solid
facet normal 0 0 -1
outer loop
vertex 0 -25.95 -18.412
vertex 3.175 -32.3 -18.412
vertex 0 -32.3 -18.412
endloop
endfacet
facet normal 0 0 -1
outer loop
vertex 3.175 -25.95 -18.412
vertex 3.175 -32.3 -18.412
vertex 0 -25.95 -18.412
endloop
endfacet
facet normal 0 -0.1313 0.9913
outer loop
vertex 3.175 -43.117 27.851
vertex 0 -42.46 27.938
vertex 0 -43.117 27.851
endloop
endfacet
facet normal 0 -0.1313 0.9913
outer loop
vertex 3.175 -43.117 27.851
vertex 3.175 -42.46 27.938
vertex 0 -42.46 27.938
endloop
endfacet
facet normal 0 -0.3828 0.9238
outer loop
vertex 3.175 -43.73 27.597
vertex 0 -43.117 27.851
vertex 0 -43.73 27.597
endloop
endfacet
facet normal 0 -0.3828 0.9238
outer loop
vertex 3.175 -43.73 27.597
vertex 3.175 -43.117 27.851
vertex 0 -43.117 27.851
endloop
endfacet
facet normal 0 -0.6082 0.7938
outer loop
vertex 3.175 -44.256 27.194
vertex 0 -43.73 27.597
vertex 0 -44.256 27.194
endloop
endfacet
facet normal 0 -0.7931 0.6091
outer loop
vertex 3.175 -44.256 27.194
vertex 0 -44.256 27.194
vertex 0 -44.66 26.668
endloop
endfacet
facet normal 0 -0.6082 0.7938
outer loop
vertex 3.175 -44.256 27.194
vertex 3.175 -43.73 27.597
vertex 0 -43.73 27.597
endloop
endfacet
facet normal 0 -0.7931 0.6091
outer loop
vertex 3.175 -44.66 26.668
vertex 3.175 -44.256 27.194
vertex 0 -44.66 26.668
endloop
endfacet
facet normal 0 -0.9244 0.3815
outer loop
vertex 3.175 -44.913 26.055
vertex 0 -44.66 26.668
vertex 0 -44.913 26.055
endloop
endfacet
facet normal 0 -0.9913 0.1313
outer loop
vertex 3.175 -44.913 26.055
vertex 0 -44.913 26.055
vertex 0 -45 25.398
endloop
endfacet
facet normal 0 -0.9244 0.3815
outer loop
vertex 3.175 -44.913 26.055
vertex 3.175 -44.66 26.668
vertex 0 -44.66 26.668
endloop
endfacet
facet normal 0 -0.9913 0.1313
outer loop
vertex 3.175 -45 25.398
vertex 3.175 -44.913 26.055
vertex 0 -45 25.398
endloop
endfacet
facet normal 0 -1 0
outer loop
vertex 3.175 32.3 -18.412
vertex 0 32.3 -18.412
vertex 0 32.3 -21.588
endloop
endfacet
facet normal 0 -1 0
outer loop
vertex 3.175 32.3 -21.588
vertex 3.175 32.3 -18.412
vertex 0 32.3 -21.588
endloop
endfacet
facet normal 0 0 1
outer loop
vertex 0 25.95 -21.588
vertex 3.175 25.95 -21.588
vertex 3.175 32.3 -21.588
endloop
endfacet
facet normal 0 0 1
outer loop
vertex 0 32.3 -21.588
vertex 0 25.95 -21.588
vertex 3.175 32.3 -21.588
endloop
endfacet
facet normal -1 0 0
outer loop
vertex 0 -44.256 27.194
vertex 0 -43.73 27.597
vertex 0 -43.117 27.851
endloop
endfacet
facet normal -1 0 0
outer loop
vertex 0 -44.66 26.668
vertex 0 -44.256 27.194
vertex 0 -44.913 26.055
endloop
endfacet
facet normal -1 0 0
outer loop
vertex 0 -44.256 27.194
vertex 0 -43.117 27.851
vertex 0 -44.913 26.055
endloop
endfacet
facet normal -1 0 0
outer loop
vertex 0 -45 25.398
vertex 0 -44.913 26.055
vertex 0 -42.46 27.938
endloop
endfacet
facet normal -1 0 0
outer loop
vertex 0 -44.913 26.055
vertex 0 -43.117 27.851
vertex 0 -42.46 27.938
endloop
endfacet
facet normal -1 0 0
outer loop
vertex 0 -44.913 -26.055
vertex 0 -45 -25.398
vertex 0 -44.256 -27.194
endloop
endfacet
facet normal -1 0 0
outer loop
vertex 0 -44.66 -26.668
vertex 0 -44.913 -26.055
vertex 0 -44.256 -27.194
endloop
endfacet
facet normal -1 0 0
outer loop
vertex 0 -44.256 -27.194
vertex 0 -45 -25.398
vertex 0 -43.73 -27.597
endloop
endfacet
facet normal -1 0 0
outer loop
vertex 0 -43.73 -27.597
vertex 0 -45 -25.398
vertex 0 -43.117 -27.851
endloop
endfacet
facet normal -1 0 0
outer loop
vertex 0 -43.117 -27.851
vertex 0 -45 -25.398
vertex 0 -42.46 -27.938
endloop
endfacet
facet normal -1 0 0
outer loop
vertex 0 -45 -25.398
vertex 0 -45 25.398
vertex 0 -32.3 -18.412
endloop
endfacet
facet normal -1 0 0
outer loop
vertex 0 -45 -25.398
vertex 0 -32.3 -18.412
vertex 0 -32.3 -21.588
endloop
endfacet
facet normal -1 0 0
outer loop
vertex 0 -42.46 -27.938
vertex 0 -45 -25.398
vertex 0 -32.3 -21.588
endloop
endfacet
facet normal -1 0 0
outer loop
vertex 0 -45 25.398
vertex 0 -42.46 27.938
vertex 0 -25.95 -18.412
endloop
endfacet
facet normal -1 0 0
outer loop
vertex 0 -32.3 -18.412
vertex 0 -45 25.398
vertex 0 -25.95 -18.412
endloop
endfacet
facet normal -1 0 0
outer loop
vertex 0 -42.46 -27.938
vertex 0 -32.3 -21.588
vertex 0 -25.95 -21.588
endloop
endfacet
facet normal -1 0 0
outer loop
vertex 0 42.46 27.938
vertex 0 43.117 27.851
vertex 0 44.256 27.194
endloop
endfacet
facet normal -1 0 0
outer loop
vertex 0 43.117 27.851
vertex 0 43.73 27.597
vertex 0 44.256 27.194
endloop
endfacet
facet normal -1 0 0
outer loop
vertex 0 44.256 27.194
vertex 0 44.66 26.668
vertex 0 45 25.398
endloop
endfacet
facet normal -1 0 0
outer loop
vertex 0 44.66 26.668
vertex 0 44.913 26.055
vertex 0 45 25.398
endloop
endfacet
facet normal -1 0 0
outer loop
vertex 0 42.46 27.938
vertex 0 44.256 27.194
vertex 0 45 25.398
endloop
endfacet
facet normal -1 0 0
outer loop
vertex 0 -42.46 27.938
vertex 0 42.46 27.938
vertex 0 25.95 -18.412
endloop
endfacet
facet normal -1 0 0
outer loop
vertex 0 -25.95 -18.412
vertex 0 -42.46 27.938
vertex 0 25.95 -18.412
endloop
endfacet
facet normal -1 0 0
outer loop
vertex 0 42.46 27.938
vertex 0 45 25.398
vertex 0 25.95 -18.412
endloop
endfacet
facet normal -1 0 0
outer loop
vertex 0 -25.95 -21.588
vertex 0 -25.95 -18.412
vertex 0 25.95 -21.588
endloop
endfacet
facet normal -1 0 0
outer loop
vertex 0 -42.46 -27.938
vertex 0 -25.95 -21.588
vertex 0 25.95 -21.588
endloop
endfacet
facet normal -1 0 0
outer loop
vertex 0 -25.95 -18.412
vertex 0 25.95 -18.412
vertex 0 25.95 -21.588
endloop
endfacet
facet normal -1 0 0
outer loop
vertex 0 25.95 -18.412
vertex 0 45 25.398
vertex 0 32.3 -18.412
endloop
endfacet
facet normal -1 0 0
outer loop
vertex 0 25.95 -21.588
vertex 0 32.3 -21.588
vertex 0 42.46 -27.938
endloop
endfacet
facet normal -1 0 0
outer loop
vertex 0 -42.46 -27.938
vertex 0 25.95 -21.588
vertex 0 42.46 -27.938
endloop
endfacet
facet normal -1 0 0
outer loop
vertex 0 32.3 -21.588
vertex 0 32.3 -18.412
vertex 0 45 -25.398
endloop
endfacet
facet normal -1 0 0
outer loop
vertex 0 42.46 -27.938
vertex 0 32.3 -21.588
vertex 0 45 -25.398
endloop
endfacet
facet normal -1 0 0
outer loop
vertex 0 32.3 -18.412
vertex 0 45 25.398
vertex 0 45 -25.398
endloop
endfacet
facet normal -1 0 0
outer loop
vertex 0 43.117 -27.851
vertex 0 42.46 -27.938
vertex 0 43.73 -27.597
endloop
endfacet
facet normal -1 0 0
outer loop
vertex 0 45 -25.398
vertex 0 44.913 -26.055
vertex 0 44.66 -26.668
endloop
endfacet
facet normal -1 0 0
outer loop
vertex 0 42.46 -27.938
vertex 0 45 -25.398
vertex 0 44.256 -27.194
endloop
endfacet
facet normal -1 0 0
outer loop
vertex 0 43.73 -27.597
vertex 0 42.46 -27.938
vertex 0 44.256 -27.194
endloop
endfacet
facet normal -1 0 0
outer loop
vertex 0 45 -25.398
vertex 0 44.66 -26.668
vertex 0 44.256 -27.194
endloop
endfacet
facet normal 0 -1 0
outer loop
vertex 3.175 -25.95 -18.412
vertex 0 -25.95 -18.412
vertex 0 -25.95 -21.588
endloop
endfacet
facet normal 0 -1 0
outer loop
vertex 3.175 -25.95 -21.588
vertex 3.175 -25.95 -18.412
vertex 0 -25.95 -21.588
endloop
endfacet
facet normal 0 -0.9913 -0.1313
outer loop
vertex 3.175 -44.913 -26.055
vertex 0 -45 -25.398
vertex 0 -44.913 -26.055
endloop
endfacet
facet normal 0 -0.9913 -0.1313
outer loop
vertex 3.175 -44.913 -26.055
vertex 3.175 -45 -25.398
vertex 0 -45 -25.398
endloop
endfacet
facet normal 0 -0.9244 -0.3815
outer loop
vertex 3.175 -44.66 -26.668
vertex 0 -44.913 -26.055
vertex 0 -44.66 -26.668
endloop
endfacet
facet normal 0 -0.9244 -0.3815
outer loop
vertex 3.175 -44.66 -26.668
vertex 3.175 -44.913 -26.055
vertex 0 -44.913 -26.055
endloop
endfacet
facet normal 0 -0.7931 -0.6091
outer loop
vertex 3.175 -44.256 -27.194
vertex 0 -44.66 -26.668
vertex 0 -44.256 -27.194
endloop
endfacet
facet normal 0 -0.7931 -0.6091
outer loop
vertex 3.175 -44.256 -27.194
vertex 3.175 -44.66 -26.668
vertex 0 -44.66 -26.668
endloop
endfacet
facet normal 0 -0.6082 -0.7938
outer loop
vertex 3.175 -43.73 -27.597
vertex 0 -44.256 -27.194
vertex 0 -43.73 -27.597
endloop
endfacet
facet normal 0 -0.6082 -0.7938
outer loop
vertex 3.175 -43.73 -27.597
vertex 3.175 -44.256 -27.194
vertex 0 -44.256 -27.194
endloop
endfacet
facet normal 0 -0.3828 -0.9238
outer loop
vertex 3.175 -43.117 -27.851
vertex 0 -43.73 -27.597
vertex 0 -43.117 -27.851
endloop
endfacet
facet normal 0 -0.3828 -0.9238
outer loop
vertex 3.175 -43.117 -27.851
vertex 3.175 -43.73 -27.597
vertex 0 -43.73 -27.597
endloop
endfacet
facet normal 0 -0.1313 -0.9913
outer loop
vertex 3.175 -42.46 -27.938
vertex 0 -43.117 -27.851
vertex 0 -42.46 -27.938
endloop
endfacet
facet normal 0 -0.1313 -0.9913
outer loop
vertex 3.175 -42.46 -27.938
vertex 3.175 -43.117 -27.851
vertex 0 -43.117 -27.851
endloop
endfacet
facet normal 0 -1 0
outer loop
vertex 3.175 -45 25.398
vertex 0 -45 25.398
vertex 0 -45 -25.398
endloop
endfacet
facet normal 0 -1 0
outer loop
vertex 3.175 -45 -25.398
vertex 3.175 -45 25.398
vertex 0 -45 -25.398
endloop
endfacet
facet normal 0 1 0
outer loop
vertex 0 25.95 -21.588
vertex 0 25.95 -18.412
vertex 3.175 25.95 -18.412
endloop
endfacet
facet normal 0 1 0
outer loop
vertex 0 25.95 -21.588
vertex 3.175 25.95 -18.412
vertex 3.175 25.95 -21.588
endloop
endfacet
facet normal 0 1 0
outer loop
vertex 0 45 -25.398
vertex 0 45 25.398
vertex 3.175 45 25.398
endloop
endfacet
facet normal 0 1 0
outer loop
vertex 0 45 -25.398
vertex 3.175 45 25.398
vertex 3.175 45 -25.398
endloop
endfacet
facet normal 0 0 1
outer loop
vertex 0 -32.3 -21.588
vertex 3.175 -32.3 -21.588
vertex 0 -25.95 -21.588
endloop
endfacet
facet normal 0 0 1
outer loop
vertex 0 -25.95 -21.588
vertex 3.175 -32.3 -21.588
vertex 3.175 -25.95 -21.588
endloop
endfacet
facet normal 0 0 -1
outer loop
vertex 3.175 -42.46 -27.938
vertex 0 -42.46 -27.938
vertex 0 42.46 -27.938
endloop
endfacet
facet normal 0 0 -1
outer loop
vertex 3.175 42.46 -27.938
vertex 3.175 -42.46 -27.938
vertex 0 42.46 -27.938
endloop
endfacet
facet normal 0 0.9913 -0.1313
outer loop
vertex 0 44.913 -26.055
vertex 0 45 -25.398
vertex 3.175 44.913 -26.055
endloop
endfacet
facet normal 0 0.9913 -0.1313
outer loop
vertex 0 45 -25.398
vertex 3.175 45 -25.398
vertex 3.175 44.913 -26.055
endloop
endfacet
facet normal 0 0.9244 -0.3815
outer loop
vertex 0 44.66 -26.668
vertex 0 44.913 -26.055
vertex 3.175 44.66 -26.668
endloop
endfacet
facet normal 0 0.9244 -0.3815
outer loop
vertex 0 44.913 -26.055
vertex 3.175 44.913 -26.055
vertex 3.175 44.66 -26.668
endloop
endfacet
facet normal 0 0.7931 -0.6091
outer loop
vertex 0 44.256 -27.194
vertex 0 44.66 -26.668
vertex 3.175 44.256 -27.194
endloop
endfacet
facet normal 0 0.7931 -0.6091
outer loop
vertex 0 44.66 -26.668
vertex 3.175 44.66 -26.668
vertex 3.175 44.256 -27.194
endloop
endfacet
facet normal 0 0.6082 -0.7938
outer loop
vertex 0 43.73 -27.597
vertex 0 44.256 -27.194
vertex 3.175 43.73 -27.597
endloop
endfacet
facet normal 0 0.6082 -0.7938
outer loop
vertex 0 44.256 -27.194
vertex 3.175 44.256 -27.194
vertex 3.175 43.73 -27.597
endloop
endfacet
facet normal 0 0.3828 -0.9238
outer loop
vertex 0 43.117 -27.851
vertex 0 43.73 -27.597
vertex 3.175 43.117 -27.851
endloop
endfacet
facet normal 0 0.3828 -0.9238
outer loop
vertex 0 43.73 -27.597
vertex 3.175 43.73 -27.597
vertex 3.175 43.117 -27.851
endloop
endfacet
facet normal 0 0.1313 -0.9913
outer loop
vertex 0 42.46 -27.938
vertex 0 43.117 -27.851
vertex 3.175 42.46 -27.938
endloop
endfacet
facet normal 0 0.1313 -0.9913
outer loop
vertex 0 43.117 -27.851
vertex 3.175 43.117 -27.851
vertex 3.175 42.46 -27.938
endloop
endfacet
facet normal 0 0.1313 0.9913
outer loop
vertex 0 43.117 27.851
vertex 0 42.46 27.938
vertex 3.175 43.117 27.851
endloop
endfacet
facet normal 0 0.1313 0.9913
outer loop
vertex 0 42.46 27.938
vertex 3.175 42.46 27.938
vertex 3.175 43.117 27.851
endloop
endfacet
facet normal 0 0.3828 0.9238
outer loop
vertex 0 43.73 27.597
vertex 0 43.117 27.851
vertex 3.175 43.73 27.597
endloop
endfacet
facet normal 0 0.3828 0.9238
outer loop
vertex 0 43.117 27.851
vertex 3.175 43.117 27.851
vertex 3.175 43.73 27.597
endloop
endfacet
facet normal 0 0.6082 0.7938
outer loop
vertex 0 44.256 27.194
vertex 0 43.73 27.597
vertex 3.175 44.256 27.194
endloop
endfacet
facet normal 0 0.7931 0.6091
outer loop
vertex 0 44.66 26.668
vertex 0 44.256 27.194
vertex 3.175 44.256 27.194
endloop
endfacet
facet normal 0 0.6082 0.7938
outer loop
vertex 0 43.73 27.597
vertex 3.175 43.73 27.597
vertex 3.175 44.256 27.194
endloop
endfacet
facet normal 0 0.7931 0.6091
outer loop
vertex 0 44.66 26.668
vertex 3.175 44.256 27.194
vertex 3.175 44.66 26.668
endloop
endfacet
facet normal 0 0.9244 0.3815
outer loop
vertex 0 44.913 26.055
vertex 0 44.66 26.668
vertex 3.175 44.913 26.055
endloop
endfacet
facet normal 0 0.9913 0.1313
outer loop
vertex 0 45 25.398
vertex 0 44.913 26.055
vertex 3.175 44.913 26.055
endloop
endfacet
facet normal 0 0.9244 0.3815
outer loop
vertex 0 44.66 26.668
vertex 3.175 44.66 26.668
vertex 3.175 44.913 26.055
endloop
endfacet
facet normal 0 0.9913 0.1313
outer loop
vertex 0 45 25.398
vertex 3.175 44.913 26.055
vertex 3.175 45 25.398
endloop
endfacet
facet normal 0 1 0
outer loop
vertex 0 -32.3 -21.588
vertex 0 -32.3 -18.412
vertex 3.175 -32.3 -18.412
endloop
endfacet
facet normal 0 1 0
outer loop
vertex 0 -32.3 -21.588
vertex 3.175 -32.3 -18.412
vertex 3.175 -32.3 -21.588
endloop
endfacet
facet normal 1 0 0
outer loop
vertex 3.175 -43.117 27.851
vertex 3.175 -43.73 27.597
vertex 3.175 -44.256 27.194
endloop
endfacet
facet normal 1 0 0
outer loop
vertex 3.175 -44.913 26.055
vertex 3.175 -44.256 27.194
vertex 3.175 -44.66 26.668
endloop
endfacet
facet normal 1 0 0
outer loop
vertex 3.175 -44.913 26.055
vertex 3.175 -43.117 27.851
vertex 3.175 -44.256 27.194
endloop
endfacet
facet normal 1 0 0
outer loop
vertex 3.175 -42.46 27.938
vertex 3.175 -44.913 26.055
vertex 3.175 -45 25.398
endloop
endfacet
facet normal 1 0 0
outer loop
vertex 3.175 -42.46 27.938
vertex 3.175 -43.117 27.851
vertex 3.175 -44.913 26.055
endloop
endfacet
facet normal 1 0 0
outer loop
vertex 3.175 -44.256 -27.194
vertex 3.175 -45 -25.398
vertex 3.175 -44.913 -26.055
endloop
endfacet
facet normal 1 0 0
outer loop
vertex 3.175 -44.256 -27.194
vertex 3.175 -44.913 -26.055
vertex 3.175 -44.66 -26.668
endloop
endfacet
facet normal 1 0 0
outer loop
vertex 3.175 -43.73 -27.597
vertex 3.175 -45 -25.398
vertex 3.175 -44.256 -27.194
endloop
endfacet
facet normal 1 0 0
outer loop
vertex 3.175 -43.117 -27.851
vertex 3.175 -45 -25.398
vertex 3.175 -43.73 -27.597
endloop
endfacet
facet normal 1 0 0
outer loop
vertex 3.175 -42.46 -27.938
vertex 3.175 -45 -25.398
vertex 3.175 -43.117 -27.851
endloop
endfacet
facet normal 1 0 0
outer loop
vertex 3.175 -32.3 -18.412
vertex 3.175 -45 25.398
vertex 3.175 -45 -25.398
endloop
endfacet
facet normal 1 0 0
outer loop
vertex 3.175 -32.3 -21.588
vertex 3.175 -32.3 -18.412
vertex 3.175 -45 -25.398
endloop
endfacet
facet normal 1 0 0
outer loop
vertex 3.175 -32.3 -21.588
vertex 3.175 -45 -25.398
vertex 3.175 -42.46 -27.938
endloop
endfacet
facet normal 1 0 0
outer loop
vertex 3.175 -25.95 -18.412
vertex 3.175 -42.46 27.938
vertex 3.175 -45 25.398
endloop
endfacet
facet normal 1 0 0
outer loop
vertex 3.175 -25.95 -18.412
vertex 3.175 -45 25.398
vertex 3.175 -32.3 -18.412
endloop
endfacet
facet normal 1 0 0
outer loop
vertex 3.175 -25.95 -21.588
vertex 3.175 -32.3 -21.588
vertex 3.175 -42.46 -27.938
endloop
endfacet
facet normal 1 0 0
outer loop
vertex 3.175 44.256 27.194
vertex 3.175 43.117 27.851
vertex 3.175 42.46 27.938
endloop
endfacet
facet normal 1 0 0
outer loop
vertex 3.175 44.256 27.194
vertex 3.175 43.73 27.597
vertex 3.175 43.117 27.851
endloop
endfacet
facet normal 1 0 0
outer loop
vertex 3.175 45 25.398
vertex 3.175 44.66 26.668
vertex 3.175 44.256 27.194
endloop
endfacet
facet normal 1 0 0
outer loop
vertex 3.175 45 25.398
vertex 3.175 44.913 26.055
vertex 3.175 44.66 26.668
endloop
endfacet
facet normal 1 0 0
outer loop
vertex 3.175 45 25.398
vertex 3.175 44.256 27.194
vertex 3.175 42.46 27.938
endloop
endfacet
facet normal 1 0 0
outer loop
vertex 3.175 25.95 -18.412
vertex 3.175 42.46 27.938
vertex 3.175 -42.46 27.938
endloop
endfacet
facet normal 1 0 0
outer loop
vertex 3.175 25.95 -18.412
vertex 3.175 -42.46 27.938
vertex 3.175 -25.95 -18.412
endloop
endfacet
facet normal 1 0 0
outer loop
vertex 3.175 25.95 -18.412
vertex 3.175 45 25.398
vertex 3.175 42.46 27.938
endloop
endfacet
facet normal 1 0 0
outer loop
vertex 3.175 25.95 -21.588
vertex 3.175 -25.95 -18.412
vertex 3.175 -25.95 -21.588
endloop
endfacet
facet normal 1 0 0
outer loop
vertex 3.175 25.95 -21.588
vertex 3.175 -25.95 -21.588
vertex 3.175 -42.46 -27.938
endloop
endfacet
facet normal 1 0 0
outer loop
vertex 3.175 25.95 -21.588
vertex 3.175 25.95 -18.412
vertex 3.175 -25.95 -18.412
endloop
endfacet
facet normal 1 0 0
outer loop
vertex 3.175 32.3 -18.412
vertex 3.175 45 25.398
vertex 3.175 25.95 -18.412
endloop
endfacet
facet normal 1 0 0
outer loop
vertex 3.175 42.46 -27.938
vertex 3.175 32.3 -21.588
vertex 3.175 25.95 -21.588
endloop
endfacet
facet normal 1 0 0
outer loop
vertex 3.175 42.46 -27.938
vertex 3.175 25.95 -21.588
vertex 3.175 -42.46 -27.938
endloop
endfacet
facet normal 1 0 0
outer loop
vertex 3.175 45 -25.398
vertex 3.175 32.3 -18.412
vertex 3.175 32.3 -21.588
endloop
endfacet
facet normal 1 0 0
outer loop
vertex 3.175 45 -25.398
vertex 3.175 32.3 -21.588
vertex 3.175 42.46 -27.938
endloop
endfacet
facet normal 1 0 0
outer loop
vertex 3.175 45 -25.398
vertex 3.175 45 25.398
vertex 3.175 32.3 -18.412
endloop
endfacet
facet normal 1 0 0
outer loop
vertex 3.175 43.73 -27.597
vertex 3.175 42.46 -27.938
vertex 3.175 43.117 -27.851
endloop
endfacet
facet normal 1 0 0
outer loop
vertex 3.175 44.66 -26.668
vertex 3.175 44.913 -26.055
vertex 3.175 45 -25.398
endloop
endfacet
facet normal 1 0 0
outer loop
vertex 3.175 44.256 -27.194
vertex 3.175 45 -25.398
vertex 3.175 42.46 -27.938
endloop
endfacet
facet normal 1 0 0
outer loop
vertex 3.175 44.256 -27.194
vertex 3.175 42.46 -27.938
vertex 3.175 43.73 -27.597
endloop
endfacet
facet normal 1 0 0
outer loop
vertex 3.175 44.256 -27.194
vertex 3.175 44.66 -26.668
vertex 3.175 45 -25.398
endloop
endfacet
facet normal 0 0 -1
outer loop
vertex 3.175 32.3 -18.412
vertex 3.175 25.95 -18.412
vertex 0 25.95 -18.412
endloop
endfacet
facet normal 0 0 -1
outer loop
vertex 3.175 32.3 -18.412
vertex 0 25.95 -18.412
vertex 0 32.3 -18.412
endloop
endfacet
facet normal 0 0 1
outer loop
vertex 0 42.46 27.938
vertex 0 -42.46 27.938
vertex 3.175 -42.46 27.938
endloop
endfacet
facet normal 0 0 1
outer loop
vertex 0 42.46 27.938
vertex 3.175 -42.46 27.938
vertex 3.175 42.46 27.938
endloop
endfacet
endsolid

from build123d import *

# Parameters (mm, degrees)
SKETCH1_W           = 55.875
SKETCH1_H           = 90
BOSS_EXTRUDE1_DEPTH = 3.175
SKETCH2_W           = 3.175
SKETCH2_H           = 6.35
CUT_EXTRUDE1_DEPTH  = 54.062081859
FILLET1_R           = 2.54


with BuildPart() as part:
    # Sketch1 → Boss-Extrude1 (new body)
    with BuildSketch(Plane(origin=(0, 0, 0), x_dir=(0, 0, -1), z_dir=(1, 0, 0))):
        Rectangle(SKETCH1_W, SKETCH1_H)
    extrude(amount=BOSS_EXTRUDE1_DEPTH)

    # Sketch2 → Cut-Extrude1 (cut, through all)
    with BuildSketch(Plane(origin=(3.175, 0, 0), x_dir=(0, 0, -1), z_dir=(1, 0, 0))):
        with Locations((20, 29.125)):
            Rectangle(SKETCH2_W, SKETCH2_H)
        with Locations((20, -29.125)):
            Rectangle(SKETCH2_W, SKETCH2_H)
    extrude(amount=-CUT_EXTRUDE1_DEPTH, mode=Mode.SUBTRACT)

    # Fillet1
    fillet1_edges = [part.edges().sort_by_distance(p)[0] for p in [
        (1.5875, 45, 27.9375),
        (1.5875, 45, -27.9375),
        (1.5875, -45, -27.9375),
        (1.5875, -45, 27.9375),
    ]]
    fillet(fillet1_edges, radius=FILLET1_R)


solid = part.part
